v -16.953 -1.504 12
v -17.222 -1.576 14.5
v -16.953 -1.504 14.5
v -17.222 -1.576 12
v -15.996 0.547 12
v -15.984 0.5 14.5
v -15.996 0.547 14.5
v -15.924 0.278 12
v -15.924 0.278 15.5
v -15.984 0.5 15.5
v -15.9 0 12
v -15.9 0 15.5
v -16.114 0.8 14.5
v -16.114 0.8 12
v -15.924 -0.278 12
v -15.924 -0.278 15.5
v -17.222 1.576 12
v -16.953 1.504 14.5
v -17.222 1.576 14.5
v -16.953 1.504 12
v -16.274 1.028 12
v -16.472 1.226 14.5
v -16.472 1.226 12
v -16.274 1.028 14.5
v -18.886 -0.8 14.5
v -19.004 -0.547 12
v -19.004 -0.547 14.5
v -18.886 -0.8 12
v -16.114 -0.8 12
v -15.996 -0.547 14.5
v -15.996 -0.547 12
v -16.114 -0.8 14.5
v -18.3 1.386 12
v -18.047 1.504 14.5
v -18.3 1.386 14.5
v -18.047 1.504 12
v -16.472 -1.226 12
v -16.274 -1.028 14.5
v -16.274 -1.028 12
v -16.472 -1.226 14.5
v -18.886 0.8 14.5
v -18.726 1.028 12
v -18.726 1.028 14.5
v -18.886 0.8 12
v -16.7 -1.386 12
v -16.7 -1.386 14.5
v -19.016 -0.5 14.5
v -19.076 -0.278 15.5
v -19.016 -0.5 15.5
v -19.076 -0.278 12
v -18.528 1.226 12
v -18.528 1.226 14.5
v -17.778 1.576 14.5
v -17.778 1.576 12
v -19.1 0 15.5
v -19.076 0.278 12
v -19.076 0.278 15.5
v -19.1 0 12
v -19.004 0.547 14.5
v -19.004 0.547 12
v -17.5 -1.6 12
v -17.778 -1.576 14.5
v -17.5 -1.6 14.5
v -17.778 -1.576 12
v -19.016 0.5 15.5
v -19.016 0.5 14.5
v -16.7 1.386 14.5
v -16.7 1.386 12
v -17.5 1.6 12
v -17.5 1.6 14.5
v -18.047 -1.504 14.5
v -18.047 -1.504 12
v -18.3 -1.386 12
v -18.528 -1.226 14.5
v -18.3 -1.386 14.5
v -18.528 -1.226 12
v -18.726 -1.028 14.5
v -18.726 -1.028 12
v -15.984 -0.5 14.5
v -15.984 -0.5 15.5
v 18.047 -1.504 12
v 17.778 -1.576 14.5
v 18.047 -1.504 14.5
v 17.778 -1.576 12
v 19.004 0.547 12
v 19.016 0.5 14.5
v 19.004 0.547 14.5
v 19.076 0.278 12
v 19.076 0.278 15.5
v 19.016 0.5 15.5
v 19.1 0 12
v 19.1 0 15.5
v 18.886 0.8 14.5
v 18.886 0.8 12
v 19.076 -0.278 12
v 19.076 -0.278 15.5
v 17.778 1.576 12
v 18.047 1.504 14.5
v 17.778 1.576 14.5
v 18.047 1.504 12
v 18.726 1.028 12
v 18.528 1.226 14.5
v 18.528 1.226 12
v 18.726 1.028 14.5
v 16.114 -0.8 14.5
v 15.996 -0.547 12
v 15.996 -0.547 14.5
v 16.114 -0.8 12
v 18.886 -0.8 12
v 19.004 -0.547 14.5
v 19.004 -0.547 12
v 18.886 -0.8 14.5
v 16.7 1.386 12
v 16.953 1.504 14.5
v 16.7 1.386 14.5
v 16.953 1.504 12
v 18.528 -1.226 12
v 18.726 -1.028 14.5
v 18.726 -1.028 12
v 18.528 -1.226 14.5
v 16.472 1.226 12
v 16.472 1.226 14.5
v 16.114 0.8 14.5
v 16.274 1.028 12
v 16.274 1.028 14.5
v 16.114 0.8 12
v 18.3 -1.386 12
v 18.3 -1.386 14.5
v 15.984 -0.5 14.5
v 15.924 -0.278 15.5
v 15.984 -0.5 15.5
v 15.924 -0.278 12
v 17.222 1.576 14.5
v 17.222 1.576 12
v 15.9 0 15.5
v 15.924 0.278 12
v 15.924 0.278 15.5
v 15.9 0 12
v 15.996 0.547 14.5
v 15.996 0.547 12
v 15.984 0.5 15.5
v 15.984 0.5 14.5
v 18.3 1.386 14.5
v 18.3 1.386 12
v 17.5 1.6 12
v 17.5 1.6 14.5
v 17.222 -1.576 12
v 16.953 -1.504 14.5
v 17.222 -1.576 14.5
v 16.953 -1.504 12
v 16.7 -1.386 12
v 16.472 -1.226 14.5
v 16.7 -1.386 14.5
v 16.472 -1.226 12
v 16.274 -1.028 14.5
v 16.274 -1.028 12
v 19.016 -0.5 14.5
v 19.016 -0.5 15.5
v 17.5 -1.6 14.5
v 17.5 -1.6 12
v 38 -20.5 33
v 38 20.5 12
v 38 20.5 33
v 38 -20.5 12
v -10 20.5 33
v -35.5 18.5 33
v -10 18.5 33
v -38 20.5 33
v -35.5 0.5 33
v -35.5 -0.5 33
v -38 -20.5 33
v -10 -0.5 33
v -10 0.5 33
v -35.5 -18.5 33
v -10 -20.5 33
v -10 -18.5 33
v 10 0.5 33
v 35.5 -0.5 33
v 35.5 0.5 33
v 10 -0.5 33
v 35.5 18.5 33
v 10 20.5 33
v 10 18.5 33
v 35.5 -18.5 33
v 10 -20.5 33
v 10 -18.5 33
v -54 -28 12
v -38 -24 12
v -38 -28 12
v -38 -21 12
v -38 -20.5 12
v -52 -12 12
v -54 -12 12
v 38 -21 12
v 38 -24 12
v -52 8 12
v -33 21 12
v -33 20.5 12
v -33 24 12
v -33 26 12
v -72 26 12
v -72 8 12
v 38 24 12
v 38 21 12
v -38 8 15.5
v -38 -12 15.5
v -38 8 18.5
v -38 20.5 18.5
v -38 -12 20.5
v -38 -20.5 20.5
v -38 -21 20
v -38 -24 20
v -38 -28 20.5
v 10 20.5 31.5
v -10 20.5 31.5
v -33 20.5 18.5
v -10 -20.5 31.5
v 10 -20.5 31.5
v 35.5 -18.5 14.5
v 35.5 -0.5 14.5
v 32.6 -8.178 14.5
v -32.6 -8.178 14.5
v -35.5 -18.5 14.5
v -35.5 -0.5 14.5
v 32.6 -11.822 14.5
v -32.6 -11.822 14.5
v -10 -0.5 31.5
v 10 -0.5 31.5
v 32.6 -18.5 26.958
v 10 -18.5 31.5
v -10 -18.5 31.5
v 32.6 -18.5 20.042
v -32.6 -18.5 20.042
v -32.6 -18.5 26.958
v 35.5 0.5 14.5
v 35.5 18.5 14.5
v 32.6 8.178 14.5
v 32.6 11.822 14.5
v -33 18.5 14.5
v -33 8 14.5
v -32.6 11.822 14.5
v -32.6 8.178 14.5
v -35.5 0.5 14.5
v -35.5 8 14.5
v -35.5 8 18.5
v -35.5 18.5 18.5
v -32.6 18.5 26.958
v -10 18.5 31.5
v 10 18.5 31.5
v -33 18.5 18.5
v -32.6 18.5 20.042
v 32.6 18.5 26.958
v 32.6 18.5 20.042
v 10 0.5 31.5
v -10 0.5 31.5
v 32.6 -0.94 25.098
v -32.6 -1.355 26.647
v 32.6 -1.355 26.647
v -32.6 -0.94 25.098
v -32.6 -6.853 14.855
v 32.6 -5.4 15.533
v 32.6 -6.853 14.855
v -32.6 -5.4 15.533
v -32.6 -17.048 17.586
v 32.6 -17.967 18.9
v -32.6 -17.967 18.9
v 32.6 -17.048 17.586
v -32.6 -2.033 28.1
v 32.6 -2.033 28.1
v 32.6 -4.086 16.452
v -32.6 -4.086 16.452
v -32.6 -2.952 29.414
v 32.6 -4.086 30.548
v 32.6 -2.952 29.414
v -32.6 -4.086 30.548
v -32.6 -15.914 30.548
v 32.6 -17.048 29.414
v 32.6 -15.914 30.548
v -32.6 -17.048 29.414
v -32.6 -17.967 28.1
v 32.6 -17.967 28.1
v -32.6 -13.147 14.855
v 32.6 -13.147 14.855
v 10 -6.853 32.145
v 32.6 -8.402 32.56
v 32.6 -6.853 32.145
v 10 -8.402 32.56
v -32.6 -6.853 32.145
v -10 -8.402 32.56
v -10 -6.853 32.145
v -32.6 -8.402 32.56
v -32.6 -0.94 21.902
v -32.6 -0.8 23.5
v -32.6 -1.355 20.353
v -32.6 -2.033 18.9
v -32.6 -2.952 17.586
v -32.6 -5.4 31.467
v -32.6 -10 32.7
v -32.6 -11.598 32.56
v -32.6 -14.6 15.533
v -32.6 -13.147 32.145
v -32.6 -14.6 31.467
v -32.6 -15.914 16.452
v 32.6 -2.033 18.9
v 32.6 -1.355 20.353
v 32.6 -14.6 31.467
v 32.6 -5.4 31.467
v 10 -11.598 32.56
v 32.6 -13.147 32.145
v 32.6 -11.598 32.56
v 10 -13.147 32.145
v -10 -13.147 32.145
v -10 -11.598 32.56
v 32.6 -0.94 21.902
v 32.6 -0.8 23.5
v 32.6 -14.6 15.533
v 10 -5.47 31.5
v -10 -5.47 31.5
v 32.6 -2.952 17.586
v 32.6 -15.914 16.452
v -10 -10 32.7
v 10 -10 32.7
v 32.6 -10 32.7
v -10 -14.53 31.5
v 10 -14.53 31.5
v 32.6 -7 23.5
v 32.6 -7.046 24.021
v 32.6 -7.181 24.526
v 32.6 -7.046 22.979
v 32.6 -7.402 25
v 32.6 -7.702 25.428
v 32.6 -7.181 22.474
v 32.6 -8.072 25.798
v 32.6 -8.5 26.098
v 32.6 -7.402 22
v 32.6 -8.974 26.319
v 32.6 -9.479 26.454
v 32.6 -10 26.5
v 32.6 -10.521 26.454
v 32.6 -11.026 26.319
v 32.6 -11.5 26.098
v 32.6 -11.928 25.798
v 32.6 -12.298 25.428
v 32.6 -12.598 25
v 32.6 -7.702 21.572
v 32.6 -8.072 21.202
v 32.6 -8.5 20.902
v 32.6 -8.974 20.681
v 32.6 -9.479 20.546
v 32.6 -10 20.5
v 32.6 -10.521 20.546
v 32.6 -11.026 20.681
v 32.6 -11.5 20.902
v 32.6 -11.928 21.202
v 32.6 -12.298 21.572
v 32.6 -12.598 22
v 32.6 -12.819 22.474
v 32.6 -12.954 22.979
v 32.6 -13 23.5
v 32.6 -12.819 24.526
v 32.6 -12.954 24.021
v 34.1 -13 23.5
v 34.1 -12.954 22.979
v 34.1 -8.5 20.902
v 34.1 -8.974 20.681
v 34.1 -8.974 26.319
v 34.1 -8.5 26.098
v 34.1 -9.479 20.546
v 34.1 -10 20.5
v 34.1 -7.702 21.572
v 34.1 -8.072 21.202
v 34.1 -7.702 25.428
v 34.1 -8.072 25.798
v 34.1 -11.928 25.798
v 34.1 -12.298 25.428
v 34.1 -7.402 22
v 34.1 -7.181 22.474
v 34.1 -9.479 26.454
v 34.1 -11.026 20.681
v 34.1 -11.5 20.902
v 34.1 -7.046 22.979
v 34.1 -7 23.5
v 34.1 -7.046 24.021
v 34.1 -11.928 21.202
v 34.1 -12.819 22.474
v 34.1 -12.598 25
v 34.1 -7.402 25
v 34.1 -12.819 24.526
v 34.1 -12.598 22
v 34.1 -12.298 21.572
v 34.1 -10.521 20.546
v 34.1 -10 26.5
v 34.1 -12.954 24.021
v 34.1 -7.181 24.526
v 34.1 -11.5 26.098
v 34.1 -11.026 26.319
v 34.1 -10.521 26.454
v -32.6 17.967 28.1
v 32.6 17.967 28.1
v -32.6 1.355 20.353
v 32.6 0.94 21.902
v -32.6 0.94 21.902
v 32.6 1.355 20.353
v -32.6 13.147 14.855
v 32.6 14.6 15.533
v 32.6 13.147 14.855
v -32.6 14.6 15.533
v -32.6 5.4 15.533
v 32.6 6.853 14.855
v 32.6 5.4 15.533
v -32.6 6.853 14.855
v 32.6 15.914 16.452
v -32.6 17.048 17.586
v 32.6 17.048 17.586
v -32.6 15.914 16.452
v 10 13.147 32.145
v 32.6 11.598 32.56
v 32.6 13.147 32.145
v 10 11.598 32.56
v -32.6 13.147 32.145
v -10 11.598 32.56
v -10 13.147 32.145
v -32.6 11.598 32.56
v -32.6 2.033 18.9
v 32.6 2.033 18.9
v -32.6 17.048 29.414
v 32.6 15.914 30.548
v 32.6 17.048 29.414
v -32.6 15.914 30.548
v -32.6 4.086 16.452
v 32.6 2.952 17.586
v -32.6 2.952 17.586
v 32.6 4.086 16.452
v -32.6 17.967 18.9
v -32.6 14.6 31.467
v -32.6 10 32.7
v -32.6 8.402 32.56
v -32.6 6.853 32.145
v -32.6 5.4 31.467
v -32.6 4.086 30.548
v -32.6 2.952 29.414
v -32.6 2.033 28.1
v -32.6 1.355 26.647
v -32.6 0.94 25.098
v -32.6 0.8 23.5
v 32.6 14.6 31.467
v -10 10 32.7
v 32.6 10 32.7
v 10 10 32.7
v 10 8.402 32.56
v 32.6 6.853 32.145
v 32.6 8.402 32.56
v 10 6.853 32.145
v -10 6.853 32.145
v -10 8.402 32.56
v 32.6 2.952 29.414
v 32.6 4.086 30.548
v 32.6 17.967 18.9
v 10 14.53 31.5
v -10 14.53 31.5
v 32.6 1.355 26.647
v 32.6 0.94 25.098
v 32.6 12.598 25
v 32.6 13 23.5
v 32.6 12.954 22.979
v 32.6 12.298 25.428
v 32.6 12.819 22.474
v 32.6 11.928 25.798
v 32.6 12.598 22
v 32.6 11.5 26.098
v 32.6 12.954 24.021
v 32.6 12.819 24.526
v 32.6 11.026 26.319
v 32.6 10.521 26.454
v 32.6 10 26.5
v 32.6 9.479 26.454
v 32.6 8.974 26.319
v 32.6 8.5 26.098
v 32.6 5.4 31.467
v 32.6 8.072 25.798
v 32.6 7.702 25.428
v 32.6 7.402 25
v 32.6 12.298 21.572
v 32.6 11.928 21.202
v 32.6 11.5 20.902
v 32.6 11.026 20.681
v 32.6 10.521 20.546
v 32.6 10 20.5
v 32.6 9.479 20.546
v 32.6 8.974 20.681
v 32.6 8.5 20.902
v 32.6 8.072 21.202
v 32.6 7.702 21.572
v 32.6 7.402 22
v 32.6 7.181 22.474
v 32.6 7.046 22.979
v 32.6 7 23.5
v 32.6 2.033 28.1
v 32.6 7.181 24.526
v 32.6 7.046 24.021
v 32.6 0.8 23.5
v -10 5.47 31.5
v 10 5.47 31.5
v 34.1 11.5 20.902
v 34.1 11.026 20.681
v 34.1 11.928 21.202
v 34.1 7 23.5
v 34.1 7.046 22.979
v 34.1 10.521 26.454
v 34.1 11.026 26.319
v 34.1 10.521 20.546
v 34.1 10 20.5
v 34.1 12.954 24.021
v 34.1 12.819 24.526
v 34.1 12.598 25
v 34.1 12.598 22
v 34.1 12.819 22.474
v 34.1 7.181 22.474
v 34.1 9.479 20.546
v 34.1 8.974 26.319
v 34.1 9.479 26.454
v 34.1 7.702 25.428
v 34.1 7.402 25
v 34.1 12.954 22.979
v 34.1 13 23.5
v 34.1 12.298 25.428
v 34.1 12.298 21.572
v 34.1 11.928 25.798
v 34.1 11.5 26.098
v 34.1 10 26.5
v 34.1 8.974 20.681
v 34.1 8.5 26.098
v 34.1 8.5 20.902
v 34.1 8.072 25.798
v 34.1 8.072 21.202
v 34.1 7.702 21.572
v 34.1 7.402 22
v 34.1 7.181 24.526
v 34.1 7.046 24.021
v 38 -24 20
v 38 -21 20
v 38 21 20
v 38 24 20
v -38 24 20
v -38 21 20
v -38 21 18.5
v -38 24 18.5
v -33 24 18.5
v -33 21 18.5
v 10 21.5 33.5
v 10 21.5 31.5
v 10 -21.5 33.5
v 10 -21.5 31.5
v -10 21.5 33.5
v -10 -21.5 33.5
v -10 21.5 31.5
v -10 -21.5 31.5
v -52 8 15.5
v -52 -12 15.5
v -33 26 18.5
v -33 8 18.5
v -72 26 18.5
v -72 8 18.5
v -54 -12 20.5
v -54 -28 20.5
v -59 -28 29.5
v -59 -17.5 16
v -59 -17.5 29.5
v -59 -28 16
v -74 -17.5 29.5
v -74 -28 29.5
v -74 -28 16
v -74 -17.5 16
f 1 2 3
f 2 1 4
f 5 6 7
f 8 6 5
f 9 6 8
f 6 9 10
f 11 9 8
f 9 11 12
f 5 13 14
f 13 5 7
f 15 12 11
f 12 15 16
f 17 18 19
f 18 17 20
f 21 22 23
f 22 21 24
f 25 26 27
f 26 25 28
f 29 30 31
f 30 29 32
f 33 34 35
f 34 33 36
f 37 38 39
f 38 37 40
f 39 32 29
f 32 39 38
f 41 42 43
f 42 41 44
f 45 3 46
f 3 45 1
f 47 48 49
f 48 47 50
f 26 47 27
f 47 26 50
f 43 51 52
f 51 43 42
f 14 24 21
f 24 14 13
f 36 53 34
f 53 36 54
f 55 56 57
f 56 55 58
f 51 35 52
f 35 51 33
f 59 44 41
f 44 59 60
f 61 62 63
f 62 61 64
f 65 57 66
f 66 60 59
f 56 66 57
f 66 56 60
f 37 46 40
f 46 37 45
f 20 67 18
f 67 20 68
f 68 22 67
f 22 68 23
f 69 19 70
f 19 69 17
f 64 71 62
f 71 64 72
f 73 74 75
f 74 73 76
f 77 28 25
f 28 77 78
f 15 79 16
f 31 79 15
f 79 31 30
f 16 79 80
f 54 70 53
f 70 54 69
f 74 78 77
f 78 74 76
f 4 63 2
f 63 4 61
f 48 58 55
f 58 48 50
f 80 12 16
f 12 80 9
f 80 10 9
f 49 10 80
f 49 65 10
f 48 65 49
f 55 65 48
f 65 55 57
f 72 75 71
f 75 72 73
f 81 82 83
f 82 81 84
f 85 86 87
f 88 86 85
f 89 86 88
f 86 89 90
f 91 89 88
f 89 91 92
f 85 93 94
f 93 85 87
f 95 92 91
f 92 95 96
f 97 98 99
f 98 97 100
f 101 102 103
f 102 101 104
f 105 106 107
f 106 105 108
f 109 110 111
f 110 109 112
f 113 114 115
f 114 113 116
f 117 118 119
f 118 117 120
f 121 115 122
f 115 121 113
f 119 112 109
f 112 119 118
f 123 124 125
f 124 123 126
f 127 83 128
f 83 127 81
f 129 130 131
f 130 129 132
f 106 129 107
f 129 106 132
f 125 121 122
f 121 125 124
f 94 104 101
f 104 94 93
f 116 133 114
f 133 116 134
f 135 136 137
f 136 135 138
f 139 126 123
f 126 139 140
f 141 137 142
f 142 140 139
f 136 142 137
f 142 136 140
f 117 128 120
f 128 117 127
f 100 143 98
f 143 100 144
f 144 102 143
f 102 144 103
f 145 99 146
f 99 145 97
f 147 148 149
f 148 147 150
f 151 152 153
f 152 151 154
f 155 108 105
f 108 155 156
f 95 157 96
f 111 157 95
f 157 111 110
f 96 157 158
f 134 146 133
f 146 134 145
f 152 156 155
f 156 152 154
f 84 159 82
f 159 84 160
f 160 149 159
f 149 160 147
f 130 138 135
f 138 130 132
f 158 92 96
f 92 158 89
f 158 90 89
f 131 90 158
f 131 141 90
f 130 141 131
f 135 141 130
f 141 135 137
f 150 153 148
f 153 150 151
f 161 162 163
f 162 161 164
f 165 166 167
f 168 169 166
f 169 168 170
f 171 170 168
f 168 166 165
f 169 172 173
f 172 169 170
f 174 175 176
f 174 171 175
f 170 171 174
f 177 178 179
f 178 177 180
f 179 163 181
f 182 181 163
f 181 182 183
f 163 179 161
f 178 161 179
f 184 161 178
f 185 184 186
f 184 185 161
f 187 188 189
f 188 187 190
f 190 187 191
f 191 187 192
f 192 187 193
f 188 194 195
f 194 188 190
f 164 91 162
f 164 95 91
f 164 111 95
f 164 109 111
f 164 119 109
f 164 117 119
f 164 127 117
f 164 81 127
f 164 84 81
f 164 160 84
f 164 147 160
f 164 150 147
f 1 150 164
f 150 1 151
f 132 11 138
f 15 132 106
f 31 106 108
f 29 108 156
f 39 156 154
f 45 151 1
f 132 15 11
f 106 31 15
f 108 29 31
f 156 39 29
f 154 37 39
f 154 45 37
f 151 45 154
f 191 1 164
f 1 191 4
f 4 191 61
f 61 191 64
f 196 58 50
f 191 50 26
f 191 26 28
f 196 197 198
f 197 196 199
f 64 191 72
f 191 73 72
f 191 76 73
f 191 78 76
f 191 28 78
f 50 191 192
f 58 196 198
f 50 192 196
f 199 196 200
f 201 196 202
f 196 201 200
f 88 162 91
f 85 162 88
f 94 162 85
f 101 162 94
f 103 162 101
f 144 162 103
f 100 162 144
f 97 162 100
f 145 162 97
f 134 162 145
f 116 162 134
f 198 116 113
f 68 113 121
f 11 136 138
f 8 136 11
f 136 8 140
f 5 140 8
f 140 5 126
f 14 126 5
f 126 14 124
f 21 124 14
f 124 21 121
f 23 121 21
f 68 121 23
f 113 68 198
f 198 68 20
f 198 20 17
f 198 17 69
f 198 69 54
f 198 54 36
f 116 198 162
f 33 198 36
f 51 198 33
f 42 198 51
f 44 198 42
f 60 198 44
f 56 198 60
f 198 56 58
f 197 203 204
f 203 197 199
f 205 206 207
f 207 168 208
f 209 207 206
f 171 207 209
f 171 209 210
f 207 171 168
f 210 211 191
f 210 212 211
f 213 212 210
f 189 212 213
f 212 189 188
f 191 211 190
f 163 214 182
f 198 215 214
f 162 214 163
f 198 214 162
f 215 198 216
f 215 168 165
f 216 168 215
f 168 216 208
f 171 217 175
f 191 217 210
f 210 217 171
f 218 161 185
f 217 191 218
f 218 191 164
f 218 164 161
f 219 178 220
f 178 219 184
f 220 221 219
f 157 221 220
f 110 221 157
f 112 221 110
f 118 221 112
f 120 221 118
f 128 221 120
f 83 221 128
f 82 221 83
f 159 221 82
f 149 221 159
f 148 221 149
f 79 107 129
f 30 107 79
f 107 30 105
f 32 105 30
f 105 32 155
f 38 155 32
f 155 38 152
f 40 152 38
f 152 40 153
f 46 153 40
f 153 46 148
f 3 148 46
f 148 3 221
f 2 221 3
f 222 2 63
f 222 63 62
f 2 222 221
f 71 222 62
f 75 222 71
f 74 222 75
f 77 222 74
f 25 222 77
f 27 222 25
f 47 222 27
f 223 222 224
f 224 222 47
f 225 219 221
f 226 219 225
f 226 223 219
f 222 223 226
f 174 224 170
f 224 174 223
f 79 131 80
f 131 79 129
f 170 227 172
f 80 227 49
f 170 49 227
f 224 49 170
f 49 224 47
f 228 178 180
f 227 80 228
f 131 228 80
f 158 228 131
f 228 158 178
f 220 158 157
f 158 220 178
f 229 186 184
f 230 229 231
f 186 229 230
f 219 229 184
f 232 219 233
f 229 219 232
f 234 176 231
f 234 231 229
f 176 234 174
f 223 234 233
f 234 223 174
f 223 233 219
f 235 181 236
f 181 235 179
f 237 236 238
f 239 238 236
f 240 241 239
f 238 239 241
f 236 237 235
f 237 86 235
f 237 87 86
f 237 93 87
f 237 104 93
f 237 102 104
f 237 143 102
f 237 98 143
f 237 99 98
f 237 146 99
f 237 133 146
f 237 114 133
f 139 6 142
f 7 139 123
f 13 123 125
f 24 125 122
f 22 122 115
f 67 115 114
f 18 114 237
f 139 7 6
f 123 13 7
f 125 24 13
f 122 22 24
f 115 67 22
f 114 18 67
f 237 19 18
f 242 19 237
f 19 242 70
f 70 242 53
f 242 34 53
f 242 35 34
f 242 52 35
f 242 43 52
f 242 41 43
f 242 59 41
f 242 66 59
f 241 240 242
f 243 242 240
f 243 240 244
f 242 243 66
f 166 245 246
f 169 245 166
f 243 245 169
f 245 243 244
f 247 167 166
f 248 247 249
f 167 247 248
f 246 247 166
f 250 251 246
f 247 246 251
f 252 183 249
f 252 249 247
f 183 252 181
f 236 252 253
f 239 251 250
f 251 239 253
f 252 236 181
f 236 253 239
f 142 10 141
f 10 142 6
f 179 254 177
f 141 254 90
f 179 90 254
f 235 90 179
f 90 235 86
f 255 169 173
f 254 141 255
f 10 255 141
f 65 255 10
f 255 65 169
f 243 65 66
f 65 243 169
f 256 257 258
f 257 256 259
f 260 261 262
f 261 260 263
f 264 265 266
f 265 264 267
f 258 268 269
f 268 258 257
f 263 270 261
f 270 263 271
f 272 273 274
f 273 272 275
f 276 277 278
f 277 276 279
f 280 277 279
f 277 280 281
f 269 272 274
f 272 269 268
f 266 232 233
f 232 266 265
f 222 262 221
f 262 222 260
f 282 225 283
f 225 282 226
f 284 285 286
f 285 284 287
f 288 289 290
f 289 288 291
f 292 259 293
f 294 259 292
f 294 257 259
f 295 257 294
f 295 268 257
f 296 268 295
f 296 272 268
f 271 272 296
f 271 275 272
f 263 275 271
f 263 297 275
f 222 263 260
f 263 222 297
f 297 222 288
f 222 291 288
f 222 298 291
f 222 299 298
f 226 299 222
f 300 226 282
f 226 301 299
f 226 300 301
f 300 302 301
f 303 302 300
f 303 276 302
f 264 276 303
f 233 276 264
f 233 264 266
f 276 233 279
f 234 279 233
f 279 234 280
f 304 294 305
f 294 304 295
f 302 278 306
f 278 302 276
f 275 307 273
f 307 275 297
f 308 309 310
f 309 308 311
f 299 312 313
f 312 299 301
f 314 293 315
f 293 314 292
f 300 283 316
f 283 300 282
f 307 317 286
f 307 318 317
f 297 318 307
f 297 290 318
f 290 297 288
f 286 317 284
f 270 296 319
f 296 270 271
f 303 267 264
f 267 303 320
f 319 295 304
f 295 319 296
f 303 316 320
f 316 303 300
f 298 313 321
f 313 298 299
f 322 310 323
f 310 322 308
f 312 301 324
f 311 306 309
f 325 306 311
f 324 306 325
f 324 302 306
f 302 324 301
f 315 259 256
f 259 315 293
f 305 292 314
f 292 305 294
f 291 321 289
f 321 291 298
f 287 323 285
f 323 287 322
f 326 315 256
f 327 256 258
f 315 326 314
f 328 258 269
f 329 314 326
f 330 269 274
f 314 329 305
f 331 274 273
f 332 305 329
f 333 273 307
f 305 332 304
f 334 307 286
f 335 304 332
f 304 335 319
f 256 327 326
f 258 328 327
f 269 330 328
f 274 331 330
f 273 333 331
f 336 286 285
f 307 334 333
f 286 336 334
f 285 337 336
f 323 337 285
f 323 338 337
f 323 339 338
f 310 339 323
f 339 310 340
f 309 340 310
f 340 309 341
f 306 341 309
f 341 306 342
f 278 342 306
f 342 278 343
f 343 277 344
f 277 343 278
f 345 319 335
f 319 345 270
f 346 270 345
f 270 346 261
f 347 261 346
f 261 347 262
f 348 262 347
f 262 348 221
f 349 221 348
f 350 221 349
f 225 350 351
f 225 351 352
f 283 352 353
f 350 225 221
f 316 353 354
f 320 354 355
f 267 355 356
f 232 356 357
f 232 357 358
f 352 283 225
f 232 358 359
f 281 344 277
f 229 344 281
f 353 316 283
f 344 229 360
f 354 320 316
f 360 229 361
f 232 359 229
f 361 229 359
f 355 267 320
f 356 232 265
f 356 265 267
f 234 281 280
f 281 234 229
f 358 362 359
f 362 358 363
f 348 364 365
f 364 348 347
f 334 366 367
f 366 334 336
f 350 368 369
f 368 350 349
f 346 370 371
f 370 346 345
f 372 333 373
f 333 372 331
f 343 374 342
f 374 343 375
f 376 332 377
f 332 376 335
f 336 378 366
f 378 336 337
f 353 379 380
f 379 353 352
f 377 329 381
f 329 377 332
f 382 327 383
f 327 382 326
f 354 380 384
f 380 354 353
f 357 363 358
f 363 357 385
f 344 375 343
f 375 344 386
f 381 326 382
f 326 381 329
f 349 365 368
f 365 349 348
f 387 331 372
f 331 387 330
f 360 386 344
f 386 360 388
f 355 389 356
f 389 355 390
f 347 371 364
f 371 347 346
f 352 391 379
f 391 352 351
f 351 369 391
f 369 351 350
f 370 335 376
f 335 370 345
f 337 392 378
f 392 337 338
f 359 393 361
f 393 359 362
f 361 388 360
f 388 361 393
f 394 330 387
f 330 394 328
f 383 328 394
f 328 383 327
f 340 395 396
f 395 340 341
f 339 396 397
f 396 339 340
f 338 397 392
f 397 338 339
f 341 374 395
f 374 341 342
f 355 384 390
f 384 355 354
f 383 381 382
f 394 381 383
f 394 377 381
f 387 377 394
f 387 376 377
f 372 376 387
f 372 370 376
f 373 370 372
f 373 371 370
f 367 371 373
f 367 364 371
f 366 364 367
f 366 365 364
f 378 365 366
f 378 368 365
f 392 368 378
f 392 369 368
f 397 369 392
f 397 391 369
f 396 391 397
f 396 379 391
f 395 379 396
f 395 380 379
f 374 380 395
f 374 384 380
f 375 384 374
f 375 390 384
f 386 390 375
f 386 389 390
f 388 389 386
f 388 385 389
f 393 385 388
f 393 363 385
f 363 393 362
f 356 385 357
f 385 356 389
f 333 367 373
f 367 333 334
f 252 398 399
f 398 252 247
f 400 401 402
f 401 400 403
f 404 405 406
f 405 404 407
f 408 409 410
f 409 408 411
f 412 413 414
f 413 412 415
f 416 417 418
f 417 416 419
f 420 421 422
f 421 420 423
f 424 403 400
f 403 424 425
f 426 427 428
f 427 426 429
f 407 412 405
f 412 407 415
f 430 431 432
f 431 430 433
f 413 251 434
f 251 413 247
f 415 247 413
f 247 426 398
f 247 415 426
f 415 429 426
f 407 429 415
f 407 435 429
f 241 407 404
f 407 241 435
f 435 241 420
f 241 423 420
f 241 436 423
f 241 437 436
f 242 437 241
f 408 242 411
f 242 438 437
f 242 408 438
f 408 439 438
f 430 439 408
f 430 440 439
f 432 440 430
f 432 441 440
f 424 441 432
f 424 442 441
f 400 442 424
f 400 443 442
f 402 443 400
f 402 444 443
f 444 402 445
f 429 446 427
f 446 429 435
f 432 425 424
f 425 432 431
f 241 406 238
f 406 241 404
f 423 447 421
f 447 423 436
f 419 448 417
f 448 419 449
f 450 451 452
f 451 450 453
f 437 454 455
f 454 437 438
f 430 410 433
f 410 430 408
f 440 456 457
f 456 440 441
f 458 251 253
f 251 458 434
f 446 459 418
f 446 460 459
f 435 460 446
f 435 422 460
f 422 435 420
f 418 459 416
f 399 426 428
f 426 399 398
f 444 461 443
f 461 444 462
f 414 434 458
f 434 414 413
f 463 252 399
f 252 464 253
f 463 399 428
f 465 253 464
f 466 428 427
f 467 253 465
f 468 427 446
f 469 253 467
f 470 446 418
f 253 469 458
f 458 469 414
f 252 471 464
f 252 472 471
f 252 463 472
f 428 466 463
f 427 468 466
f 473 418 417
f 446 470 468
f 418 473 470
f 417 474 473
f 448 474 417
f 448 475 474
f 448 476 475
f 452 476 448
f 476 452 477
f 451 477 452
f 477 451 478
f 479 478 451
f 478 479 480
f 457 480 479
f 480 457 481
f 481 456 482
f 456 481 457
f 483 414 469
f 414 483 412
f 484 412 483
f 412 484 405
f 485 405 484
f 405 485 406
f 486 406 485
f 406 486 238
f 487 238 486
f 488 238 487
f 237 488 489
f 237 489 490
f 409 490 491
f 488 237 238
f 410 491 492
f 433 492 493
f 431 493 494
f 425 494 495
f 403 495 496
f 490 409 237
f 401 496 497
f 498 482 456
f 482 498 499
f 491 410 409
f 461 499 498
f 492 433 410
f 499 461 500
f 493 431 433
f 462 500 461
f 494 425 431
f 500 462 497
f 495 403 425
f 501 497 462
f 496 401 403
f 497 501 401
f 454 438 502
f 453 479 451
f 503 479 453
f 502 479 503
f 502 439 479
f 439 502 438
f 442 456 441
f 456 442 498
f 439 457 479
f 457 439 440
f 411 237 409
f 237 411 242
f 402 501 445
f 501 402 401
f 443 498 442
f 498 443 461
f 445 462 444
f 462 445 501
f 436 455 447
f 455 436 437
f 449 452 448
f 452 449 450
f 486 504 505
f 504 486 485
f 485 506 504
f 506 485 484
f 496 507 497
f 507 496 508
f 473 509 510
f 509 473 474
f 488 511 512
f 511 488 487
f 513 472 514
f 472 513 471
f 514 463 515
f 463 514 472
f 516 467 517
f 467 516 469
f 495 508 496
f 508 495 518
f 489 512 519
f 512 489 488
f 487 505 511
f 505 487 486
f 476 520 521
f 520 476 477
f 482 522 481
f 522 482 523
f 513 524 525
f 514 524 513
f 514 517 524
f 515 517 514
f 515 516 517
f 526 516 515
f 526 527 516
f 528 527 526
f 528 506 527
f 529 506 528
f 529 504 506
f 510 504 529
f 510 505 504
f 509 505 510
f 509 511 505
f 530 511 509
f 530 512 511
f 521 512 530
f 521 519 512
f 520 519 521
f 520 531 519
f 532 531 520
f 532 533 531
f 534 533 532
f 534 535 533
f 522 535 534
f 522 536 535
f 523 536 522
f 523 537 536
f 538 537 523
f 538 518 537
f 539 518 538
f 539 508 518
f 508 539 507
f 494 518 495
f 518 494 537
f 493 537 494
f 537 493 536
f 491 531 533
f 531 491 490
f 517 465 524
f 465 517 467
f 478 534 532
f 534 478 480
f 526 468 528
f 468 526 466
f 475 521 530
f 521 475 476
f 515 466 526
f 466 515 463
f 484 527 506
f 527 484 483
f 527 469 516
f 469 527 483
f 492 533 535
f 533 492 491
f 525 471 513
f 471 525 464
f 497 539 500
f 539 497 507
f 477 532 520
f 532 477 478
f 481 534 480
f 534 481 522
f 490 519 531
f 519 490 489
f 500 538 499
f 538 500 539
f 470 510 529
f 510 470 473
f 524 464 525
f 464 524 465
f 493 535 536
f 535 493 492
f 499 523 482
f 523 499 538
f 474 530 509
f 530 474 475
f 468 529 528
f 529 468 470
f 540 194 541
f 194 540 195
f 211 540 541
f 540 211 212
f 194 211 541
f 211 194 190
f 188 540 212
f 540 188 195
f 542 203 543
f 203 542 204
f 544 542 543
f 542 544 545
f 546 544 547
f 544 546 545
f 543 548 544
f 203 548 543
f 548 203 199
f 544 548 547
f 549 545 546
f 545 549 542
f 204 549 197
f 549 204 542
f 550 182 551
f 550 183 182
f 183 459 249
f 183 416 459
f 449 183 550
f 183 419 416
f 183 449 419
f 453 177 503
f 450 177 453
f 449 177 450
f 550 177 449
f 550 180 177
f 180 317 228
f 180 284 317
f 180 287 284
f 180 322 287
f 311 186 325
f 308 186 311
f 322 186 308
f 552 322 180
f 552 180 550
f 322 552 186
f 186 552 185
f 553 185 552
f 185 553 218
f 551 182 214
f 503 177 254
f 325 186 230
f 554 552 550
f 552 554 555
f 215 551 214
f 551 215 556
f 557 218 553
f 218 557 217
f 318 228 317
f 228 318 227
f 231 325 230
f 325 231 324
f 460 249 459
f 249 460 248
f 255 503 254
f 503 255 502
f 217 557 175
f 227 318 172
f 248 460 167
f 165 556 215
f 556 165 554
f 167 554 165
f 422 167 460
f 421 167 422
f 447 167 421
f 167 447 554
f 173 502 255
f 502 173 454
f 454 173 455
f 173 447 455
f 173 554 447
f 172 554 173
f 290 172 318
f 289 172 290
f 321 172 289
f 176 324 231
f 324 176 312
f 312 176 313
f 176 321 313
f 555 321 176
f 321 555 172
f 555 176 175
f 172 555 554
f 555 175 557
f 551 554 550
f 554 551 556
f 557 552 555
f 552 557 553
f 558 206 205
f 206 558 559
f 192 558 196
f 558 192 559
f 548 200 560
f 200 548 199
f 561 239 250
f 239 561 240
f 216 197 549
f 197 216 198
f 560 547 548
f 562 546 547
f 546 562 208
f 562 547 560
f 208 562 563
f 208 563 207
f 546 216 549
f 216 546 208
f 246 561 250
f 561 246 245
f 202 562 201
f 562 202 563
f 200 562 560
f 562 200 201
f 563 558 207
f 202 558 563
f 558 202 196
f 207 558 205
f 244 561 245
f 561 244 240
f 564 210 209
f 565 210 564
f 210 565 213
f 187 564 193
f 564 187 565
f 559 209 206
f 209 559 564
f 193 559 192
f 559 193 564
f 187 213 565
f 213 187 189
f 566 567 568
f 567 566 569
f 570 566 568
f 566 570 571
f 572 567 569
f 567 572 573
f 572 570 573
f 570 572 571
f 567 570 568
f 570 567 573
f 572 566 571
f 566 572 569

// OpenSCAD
// ============================================================================
// cute-esp32-lego-car / cad / battery-holder.scad
// 中置底层 2S 18650 核心电池仓、平头电芯防振限位框、2S BMS 与安全总开关组件
// ============================================================================

include <parameters.scad>

module battery_compartment_assembly() {
    // 1. 18650 双节串联黑色电池盒本体 (76 x 41 x 21 mm, 居中位于 Z=12.0mm)
    color([0.16, 0.16, 0.18])
    translate([-battery_holder_length/2, -battery_holder_width/2, 0])
    difference() {
        cube([battery_holder_length, battery_holder_width, battery_holder_height]);
        // 内部两槽挖空
        translate([2.5, 2.0, 2.5])
            cube([battery_holder_length - 5.0, (battery_holder_width - 5.0)/2, battery_holder_height]);
        translate([2.5, battery_holder_width/2 + 0.5, 2.5])
            cube([battery_holder_length - 5.0, (battery_holder_width - 5.0)/2, battery_holder_height]);
        // 底部 M3 沉头安装孔
        for (hx = [-battery_box_hole_dist/2, battery_box_hole_dist/2])
            translate([battery_holder_length/2 + hx, battery_holder_width/2, -0.5])
                cylinder(d = 3.2, h = 4.0);
    }

    // 2. 两节 18650 平头锂离子电芯 (Ø18.4 x 65.2 mm) + 正极强磁吸接触垫片
    for (cy = [-10.0, 10.0]) {
        color([0.18, 0.45, 0.82])
        translate([-32.6, cy, 11.5])
        rotate([0, 90, 0])
            cylinder(d = 18.4, h = 65.2);
        // 平头正极导电增强磁吸帽 (Ø6 x 1.5 mm)
        color([0.85, 0.85, 0.88])
        translate([32.6, cy, 11.5])
        rotate([0, 90, 0])
            cylinder(d = 6.0, h = 1.5);
    }

    // 3. 两侧 3mm 亚克力防滑限位护条 (兼作 1812-N20 内伸轴物理防撞隔离墙)
    color([0.85, 0.92, 0.98, 0.65])
    for (sy = [-1, 1]) {
        translate([-battery_holder_length/2,
                   sy * (battery_holder_width/2 + 0.5) - (sy < 0 ? 3.0 : 0),
                   0])
            cube([battery_holder_length, 3.0, 8.0]);
    }

    // 4. 20mm 宽防振魔术贴环抱绑带
    color([0.22, 0.22, 0.25, 0.85])
    translate([-10.0, -battery_holder_width/2 - 1.0, battery_holder_height - 1.5])
        cube([20.0, battery_holder_width + 2.0, 2.0]);

    // 5. 后置 2S 8A BMS 锂电均衡保护板 (位于电池盒后方 X = -48mm)
    color([0.10, 0.52, 0.25])
    translate([-battery_holder_length/2 - 14.0, -bms_2s_length/2, 0])
        cube([bms_2s_width, bms_2s_length, bms_2s_height]);

    // 6. 2串升压快充模块_紫板 (Row 11, Type-C 朝向车尾充电窗)
    color([0.48, 0.18, 0.62])
    translate([-chassis_length/2 + 8.0, 8.0, 0])
        cube([charger_2s_length, charger_2s_width, charger_2s_height]);

    // 7. XT60PB-F/M 电源总断开插头 (Row 28/29) + KCD11 船型总开关 + 5A 保险丝座
    color([0.95, 0.72, 0.08])
    translate([-battery_holder_length/2 - 16.0, -28.0, 0])
        cube([16.0, 16.0, 8.5]);
    // KCD11 船型总开关 (车尾右侧)
    color([0.85, 0.15, 0.15])
    translate([-chassis_length/2 + 6.0, -28.0, 4.0])
        cube([15.0, 10.5, 13.5]);
}

// 单独预览时显示电池仓总成
translate([0, 0, lower_deck_top_z])
    battery_compartment_assembly();
